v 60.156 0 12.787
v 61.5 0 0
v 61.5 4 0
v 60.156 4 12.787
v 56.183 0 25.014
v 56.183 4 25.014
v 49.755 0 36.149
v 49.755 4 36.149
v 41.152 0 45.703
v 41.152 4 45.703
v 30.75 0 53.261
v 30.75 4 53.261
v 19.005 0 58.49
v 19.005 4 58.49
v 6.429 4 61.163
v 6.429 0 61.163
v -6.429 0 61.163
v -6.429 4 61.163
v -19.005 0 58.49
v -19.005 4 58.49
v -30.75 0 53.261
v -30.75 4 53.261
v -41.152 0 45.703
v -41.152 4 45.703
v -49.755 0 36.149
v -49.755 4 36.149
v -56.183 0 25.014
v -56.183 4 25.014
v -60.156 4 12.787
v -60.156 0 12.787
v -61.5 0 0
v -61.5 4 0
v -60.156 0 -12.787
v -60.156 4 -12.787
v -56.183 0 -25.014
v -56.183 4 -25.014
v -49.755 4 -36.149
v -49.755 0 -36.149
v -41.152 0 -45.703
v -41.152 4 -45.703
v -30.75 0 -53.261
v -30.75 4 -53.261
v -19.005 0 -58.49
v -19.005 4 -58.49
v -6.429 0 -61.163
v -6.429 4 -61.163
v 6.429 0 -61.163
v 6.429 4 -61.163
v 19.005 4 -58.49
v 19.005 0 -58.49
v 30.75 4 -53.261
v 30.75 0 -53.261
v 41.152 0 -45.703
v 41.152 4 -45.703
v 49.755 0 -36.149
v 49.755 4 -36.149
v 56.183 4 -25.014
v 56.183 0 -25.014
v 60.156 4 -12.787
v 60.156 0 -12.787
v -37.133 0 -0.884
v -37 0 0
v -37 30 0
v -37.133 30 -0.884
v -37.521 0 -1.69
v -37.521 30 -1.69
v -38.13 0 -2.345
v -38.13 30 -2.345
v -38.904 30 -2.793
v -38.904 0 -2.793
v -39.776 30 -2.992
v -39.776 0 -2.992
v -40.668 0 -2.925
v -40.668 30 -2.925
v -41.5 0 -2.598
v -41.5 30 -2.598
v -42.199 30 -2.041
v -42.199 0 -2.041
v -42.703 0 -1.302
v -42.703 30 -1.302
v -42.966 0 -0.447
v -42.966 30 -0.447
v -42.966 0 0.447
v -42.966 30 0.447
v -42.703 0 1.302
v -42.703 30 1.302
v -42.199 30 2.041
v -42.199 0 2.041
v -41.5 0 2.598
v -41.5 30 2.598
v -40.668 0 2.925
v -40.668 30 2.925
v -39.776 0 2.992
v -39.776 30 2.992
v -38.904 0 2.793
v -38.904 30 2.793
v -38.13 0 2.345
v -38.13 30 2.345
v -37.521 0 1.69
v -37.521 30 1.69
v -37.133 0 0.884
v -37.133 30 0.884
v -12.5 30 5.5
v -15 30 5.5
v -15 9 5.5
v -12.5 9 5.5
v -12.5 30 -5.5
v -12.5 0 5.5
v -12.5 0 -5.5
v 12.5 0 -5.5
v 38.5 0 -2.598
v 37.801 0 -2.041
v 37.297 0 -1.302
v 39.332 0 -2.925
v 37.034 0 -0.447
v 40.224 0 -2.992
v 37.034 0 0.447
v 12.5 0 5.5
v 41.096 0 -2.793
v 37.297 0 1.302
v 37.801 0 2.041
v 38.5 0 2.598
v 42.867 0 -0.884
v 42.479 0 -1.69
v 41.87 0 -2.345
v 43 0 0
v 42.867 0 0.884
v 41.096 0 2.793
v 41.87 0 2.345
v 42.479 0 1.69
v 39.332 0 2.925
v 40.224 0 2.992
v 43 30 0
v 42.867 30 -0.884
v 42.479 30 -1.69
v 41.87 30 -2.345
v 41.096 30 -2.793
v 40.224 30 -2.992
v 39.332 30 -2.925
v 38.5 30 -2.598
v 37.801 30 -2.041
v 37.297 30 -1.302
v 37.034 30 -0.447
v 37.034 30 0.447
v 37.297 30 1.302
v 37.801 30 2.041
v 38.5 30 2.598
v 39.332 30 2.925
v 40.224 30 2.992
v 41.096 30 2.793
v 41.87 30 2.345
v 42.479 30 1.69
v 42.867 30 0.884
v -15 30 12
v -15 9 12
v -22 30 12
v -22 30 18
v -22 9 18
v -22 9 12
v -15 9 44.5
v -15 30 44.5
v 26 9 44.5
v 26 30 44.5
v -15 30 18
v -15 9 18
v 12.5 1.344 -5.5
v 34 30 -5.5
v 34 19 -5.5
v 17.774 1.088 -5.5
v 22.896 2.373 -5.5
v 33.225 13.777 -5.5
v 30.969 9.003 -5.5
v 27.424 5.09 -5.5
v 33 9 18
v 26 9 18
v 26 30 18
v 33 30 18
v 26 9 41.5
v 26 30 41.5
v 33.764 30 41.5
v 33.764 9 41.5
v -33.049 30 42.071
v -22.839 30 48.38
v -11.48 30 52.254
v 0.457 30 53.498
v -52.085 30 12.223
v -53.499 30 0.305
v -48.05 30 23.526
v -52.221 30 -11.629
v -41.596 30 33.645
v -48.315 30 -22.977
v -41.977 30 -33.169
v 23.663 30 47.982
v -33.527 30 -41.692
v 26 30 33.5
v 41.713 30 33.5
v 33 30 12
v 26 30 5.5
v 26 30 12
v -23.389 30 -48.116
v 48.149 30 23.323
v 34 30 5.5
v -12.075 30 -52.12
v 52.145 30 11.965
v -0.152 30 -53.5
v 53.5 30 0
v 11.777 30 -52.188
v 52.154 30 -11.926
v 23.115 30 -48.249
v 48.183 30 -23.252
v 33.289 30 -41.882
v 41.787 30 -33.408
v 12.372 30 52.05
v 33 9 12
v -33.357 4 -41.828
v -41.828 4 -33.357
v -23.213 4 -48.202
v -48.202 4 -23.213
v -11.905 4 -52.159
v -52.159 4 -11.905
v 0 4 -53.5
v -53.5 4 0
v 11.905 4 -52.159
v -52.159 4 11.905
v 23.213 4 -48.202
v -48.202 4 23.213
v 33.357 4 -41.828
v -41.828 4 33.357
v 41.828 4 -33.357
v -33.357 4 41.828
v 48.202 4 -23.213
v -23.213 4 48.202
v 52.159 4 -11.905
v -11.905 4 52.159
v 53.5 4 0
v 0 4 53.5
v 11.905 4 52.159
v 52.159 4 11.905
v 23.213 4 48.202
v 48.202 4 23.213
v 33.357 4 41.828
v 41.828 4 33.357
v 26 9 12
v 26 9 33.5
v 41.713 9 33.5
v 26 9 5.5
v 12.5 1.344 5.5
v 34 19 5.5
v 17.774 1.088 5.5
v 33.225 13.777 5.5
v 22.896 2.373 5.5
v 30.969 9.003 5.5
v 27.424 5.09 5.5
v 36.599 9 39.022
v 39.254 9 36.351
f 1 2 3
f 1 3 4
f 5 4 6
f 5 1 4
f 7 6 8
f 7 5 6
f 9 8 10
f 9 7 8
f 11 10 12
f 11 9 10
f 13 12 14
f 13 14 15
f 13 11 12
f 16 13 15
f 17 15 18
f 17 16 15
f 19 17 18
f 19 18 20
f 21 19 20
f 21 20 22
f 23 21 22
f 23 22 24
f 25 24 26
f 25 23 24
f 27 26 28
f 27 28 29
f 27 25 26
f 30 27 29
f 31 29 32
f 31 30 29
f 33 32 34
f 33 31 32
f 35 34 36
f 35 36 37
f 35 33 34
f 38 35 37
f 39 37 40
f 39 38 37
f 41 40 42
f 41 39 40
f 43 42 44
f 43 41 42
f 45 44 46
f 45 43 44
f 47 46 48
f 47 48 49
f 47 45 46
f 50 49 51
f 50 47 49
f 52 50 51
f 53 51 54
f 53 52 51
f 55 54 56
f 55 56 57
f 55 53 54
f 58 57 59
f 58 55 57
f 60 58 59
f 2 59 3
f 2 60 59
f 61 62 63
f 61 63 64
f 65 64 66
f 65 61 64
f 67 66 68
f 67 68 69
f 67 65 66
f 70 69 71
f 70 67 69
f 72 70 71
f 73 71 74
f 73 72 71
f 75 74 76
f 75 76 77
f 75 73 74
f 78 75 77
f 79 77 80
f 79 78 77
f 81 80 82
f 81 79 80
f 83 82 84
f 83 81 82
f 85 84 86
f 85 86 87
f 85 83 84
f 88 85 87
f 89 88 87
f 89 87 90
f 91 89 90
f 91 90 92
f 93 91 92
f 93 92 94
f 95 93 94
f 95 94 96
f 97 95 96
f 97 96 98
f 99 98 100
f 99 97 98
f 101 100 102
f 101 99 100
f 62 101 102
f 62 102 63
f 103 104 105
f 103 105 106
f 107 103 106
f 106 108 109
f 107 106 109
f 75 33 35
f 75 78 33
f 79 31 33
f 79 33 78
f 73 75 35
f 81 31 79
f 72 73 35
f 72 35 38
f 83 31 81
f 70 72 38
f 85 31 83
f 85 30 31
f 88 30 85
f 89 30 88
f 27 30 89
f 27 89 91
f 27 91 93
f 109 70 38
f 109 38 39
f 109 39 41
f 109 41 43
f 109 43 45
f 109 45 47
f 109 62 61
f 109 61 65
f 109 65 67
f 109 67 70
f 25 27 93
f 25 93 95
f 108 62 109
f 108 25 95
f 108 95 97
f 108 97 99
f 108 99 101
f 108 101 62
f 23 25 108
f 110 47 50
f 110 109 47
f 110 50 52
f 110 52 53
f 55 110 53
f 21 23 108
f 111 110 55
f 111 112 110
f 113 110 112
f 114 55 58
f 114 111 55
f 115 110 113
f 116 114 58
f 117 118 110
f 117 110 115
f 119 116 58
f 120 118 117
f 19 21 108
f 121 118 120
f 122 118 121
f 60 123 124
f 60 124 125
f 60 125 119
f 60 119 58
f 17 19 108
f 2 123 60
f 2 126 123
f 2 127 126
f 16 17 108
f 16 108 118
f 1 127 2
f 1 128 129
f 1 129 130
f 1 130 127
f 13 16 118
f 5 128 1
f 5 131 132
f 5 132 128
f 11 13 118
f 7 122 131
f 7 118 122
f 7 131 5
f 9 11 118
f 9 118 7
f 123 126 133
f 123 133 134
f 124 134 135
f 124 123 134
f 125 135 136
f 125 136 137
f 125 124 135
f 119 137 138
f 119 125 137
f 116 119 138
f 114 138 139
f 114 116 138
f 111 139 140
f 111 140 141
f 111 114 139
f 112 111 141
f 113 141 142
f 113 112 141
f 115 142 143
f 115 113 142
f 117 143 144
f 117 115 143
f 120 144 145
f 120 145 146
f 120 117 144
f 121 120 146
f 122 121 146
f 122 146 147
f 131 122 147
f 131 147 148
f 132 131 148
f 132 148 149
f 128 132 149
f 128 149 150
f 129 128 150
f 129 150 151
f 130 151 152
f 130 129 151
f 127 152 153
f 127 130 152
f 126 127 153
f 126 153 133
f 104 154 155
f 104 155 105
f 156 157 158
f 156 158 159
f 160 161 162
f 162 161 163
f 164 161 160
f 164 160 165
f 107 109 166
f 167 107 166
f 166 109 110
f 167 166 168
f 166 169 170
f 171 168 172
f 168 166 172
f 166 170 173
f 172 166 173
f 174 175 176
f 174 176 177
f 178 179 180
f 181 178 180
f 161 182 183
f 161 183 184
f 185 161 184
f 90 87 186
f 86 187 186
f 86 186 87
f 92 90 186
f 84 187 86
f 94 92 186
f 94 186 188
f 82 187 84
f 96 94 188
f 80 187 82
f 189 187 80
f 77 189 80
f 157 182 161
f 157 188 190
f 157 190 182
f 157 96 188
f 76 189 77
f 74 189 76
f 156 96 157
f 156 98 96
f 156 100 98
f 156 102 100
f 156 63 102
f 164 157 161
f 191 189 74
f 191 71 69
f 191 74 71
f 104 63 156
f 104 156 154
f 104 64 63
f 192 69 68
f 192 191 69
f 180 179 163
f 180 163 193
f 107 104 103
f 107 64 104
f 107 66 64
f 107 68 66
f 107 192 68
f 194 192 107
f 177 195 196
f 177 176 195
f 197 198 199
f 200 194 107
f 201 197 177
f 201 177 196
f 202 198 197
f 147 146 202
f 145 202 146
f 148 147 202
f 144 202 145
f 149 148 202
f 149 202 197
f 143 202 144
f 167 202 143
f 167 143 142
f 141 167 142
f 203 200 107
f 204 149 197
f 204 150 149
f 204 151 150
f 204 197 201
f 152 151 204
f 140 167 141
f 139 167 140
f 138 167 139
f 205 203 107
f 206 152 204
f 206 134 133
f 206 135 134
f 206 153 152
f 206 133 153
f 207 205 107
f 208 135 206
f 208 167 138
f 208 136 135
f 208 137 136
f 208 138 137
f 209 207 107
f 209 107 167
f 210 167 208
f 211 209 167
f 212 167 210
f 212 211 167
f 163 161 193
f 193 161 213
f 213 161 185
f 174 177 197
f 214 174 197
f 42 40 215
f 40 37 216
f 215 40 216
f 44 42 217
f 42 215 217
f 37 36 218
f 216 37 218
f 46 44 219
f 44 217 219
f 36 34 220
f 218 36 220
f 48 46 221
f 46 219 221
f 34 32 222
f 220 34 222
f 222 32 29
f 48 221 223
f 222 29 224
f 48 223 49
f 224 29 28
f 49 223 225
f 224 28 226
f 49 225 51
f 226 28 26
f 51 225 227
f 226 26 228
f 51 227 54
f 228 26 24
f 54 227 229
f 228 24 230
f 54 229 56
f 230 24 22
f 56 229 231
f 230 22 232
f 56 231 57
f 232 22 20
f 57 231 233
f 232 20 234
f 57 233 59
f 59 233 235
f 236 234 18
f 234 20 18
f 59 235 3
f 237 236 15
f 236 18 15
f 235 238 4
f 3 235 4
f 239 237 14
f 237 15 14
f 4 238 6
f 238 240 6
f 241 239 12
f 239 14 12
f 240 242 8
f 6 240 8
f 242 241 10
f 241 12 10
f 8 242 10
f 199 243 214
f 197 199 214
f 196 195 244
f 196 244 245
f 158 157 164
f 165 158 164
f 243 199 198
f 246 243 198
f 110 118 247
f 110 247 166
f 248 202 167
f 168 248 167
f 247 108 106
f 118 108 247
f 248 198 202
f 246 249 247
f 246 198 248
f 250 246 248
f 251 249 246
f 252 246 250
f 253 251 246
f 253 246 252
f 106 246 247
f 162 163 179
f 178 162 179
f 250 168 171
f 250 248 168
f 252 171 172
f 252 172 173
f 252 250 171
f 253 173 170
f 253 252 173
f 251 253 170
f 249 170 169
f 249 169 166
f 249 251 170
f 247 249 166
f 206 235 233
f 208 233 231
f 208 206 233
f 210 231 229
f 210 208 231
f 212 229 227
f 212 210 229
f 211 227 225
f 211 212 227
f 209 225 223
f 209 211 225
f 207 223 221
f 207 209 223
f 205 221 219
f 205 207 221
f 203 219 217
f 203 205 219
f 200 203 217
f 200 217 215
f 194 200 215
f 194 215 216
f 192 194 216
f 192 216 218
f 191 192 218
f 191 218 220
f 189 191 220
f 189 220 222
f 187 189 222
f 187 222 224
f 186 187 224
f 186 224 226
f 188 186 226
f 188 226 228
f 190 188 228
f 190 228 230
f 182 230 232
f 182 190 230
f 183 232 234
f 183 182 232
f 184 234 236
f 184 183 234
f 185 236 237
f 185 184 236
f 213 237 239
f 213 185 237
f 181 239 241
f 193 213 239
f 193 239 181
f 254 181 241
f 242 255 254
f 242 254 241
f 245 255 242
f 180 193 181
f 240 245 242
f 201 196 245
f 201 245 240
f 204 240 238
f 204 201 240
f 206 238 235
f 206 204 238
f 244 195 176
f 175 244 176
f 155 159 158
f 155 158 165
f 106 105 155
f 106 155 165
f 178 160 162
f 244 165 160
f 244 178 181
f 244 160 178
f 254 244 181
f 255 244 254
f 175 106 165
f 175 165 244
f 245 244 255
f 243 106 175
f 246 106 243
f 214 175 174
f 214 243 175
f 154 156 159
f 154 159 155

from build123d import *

# Parameters (mm, degrees)
ESQUISSE1_R             = 3
ESQUISSE1_W             = 25
ESQUISSE1_H             = 11
BOSS_EXTRU_1_DEPTH      = 30
ESQUISSE2_R             = 125
ESQUISSE2_R_2           = 53.5
ENL_V_MAT_EXTRU_1_DEPTH = 31
ESQUISSE8_R             = 61.5
ESQUISSE8_R_2           = 53.5
BOSS_EXTRU_2_DEPTH      = 4
ESQUISSE5_R             = 18
ENL_V_MAT_EXTRU_2_DEPTH = 11
ESQUISSE6_W             = 41
ESQUISSE6_H             = 39
ESQUISSE6_W_2           = 7
ESQUISSE6_H_2           = 6
ESQUISSE6_W_3           = 17
ESQUISSE6_H_3           = 8
ENL_V_MAT_EXTRU_3_DEPTH = 21
ESQUISSE7_W             = 36
ESQUISSE7_H             = 11
ENL_V_MAT_EXTRU_4_DEPTH = 11


with BuildPart() as part:
    # Esquisse1 → Boss.-Extru.1 (new body)
    with BuildSketch(Plane(origin=(0, 0, 0), x_dir=(1, 0, 0), z_dir=(0, 1, 0))):
        with BuildLine():
            ThreePointArc((68.106918153, 104.816256848), (54.23546739, 112.621108488), (39.484680574, 118.6))
            ThreePointArc((39.484680574, 118.6), (0, 85), (-39.484680574, 118.6))
            ThreePointArc((-39.484680574, 118.6), (-54.23546739, 112.621108488), (-68.106918153, 104.816256848))
            ThreePointArc((-68.106918153, 104.816256848), (-66.45567601, 52.996633158), (-117.343509488, 43.075524153))
            ThreePointArc((-117.343509488, 43.075524153), (-121.865989023, 27.815116745), (-124.412618383, 12.103734428))
            ThreePointArc((-124.412618383, 12.103734428), (-82.868872535, -18.914279386), (-106.840282387, -64.885699962))
            ThreePointArc((-106.840282387, -64.885699962), (-97.728935309, -77.936225232), (-87.033079415, -89.723146888))
            ThreePointArc((-87.033079415, -89.723146888), (-36.880117825, -76.582353772), (-15.884143503, -123.986668578))
            ThreePointArc((-15.884143503, -123.986668578), (0, -125), (15.884143503, -123.986668578))
            ThreePointArc((15.884143503, -123.986668578), (36.880117825, -76.582353772), (87.033079415, -89.723146888))
            ThreePointArc((87.033079415, -89.723146888), (97.728935309, -77.936225232), (106.840282387, -64.885699962))
            ThreePointArc((106.840282387, -64.885699962), (82.868872535, -18.914279386), (124.412618383, 12.103734428))
            ThreePointArc((124.412618383, 12.103734428), (121.865989023, 27.815116745), (117.343509488, 43.075524153))
            ThreePointArc((117.343509488, 43.075524153), (66.45567601, 52.996633158), (68.106918153, 104.816256848))
        make_face()
        with Locations((-40, 0)):
            Circle(ESQUISSE1_R, mode=Mode.SUBTRACT)
        with Locations((40, 0)):
            Circle(ESQUISSE1_R, mode=Mode.SUBTRACT)
        Rectangle(ESQUISSE1_W, ESQUISSE1_H, mode=Mode.SUBTRACT)
    extrude(amount=BOSS_EXTRU_1_DEPTH)

    # Esquisse2 → Enlèv. mat.-Extru.1 (cut, through all)
    with BuildSketch(Plane(origin=(0, 30, 0), x_dir=(1, 0, 0), z_dir=(0, 1, 0))):
        Circle(ESQUISSE2_R)
        Circle(ESQUISSE2_R_2, mode=Mode.SUBTRACT)
    extrude(amount=-ENL_V_MAT_EXTRU_1_DEPTH, mode=Mode.SUBTRACT)

    # Esquisse8 → Boss.-Extru.2 (add)
    with BuildSketch(Plane.XZ):
        Circle(ESQUISSE8_R)
        Circle(ESQUISSE8_R_2, mode=Mode.SUBTRACT)
    extrude(amount=-BOSS_EXTRU_2_DEPTH)

    # Esquisse5 → Enlèv. mat.-Extru.2 (cut)
    with BuildSketch(Plane(origin=(0, 0, 5.5), x_dir=(-1, 0, 0), z_dir=(0, 0, -1))):
        with Locations((-16, 19)):
            Circle(ESQUISSE5_R)
    extrude(amount=ENL_V_MAT_EXTRU_2_DEPTH, mode=Mode.SUBTRACT)

    # Esquisse6 → Enlèv. mat.-Extru.3 (cut)
    with BuildSketch(Plane(origin=(0, 30, 0), x_dir=(1, 0, 0), z_dir=(0, 1, 0))):
        with Locations((5.5, -25)):
            Rectangle(ESQUISSE6_W, ESQUISSE6_H)
        with Locations((-18.5, -15)):
            Rectangle(ESQUISSE6_W_2, ESQUISSE6_H_2)
        with Locations((29.5, -15)):
            Rectangle(ESQUISSE6_W_2, ESQUISSE6_H_2)
        with Locations((34.5, -37.5)):
            Rectangle(ESQUISSE6_W_3, ESQUISSE6_H_3)
    extrude(amount=-ENL_V_MAT_EXTRU_3_DEPTH, mode=Mode.SUBTRACT)

    # Esquisse7 → Enlèv. mat.-Extru.4 (cut)
    with BuildSketch(Plane(origin=(0, 30, 0), x_dir=(1, 0, 0), z_dir=(0, 1, 0))):
        with Locations((16, 0)):
            Rectangle(ESQUISSE7_W, ESQUISSE7_H)
    extrude(amount=-ENL_V_MAT_EXTRU_4_DEPTH, mode=Mode.SUBTRACT)


solid = part.part
